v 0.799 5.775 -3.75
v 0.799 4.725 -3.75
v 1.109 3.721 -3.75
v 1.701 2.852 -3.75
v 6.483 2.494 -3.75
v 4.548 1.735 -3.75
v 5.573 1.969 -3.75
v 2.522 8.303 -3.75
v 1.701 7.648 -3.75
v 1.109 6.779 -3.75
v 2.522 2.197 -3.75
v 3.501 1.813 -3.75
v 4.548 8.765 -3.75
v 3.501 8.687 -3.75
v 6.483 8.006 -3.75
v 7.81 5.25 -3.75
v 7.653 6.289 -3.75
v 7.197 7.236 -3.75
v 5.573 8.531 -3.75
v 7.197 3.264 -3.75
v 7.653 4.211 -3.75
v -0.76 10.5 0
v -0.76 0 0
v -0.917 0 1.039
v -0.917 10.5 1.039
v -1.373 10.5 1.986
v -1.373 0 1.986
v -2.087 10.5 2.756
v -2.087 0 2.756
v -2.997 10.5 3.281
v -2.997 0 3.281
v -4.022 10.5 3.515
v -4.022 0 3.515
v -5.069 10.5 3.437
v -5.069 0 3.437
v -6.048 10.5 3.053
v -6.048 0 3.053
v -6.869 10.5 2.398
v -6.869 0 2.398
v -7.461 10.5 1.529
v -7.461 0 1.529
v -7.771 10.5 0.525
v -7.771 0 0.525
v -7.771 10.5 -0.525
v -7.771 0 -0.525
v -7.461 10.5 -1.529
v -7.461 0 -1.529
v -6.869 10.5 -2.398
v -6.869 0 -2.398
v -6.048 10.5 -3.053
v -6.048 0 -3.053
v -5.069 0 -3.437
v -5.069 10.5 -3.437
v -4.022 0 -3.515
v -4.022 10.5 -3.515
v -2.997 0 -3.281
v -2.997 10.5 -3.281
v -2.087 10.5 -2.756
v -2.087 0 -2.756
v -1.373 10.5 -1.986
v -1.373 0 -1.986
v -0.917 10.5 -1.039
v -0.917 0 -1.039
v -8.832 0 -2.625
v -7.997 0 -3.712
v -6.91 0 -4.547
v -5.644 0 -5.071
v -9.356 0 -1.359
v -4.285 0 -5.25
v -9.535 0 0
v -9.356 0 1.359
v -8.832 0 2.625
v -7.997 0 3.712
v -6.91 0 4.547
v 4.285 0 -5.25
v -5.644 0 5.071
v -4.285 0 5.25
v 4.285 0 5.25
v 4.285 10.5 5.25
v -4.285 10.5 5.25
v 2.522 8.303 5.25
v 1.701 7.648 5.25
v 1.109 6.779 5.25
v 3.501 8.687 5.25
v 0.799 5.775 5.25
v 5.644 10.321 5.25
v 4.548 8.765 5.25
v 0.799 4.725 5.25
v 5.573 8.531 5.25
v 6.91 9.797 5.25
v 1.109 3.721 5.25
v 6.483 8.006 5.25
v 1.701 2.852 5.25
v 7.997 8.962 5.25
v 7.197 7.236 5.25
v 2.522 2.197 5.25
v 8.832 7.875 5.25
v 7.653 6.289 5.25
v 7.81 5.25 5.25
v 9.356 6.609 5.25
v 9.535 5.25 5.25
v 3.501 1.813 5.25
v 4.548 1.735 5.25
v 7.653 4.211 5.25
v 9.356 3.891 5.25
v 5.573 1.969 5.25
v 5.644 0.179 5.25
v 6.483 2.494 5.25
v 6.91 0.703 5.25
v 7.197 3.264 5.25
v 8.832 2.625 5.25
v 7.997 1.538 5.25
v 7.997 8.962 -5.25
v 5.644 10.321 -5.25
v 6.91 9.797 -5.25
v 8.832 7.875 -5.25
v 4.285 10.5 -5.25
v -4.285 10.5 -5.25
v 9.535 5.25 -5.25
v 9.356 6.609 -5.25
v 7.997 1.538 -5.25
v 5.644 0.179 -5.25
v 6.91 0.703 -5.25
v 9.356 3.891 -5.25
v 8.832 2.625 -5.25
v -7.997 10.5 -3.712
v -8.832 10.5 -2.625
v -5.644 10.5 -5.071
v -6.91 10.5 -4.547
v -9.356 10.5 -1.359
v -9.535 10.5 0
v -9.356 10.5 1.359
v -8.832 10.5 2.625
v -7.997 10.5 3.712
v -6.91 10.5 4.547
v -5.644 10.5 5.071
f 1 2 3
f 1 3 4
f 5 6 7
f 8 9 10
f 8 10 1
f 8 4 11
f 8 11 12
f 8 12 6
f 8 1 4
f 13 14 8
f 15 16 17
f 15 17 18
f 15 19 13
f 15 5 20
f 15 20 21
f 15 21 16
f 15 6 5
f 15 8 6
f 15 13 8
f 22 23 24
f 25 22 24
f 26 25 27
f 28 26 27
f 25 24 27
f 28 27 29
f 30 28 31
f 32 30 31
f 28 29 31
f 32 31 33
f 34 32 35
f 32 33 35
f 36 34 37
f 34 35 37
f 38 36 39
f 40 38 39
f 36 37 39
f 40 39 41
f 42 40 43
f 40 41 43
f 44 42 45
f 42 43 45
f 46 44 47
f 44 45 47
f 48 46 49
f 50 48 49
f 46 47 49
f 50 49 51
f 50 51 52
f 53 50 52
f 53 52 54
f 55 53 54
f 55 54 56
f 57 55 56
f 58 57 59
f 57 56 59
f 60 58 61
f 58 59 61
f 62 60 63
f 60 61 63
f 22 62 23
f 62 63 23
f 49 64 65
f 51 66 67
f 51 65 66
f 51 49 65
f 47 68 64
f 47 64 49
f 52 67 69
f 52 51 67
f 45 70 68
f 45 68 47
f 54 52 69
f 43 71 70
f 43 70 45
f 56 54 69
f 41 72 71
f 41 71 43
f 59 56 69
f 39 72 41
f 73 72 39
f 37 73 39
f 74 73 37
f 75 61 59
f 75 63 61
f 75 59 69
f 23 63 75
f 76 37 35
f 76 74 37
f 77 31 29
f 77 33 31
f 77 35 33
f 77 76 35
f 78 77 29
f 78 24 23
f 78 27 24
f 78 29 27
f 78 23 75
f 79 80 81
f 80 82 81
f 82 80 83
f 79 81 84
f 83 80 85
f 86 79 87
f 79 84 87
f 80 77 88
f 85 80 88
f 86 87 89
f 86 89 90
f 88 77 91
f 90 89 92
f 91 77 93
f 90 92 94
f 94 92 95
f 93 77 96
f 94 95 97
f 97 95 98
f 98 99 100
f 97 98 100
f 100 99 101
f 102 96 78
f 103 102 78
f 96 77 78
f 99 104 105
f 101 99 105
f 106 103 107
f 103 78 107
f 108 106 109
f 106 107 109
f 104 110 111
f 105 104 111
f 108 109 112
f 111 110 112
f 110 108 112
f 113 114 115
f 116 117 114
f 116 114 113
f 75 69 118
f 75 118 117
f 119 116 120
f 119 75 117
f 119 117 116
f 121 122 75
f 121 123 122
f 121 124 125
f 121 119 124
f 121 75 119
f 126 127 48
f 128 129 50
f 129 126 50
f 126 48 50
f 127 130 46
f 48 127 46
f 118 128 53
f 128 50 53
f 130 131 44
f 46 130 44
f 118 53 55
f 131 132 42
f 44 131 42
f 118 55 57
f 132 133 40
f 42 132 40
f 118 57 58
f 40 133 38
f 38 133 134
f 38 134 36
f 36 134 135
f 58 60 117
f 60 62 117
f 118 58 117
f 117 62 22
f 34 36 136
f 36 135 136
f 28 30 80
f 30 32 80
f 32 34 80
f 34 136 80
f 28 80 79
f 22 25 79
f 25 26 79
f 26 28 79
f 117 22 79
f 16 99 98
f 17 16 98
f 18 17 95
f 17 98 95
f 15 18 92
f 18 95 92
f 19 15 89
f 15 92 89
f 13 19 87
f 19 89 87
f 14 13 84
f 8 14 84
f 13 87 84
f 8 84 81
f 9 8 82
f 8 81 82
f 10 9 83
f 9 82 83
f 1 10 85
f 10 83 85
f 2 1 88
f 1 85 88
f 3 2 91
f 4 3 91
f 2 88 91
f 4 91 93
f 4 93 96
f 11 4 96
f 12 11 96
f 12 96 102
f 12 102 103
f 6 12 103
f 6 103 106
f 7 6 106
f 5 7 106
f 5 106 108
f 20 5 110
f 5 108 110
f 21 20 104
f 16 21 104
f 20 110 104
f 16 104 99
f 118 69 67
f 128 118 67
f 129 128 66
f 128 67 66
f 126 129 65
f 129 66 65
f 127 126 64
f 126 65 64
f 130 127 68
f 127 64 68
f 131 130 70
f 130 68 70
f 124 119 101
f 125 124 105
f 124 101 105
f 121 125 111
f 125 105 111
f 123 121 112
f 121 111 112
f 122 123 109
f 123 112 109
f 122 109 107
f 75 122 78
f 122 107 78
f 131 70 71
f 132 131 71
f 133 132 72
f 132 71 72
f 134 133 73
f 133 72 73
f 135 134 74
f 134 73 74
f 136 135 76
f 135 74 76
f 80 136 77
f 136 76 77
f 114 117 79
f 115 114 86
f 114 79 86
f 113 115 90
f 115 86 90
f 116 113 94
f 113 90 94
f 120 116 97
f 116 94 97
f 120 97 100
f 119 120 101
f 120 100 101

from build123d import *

# Parameters (mm, degrees)
F0_W     = 19.07
F0_H     = 10.5
F1_DEPTH = 10.5
F2_R     = 3.525
F3_DEPTH = 10.5
F4_R     = 3.525
F5_DEPTH = 9
F7_DEPTH = 10.501


with BuildPart() as f1:
    # F0 (on Front) → F1 (new body)
    with BuildSketch(Plane.XZ):
        Rectangle(F0_W, F0_H)
    extrude(amount=-F1_DEPTH)

    # F2 (on face) → F3 (cut, through all)
    with BuildSketch(Plane.XZ):
        with BuildLine():
            ThreePointArc((-4.285, -5.25), (-7.997311, -3.712311), (-9.535, 0))
            Line((-9.535, 0), (-9.535, -5.25))
            Line((-9.535, -5.25), (-4.285, -5.25))
        make_face()
        with BuildLine():
            ThreePointArc((-9.535, 0), (-7.997311, 3.712311), (-4.285, 5.25))
            Line((-4.285, 5.25), (-9.535, 5.25))
            Line((-9.535, 5.25), (-9.535, 0))
        make_face()
        with Locations((-4.285, 0)):
            Circle(F2_R)
    extrude(amount=-F3_DEPTH, mode=Mode.SUBTRACT)

    # F4 (on face) → F5 (cut)
    with BuildSketch(Plane.XY.offset(5.25)):
        with Locations((4.285, 5.25)):
            Circle(F4_R)
    extrude(amount=-F5_DEPTH, mode=Mode.SUBTRACT)

    # F6 (on face) → F7 (cut, through all)
    with BuildSketch(Plane.XY.offset(5.25)):
        with BuildLine():
            ThreePointArc((4.285, 10.5), (7.997311, 8.962311), (9.535, 5.25))
            Line((9.535, 5.25), (9.535, 10.5))
            Line((9.535, 10.5), (4.285, 10.5))
        make_face()
        with BuildLine():
            ThreePointArc((9.535, 5.25), (7.997311, 1.537689), (4.285, 0))
            Line((4.285, 0), (9.535, 0))
            Line((9.535, 0), (9.535, 5.25))
        make_face()
    extrude(amount=-F7_DEPTH, mode=Mode.SUBTRACT)


solid = f1.part
